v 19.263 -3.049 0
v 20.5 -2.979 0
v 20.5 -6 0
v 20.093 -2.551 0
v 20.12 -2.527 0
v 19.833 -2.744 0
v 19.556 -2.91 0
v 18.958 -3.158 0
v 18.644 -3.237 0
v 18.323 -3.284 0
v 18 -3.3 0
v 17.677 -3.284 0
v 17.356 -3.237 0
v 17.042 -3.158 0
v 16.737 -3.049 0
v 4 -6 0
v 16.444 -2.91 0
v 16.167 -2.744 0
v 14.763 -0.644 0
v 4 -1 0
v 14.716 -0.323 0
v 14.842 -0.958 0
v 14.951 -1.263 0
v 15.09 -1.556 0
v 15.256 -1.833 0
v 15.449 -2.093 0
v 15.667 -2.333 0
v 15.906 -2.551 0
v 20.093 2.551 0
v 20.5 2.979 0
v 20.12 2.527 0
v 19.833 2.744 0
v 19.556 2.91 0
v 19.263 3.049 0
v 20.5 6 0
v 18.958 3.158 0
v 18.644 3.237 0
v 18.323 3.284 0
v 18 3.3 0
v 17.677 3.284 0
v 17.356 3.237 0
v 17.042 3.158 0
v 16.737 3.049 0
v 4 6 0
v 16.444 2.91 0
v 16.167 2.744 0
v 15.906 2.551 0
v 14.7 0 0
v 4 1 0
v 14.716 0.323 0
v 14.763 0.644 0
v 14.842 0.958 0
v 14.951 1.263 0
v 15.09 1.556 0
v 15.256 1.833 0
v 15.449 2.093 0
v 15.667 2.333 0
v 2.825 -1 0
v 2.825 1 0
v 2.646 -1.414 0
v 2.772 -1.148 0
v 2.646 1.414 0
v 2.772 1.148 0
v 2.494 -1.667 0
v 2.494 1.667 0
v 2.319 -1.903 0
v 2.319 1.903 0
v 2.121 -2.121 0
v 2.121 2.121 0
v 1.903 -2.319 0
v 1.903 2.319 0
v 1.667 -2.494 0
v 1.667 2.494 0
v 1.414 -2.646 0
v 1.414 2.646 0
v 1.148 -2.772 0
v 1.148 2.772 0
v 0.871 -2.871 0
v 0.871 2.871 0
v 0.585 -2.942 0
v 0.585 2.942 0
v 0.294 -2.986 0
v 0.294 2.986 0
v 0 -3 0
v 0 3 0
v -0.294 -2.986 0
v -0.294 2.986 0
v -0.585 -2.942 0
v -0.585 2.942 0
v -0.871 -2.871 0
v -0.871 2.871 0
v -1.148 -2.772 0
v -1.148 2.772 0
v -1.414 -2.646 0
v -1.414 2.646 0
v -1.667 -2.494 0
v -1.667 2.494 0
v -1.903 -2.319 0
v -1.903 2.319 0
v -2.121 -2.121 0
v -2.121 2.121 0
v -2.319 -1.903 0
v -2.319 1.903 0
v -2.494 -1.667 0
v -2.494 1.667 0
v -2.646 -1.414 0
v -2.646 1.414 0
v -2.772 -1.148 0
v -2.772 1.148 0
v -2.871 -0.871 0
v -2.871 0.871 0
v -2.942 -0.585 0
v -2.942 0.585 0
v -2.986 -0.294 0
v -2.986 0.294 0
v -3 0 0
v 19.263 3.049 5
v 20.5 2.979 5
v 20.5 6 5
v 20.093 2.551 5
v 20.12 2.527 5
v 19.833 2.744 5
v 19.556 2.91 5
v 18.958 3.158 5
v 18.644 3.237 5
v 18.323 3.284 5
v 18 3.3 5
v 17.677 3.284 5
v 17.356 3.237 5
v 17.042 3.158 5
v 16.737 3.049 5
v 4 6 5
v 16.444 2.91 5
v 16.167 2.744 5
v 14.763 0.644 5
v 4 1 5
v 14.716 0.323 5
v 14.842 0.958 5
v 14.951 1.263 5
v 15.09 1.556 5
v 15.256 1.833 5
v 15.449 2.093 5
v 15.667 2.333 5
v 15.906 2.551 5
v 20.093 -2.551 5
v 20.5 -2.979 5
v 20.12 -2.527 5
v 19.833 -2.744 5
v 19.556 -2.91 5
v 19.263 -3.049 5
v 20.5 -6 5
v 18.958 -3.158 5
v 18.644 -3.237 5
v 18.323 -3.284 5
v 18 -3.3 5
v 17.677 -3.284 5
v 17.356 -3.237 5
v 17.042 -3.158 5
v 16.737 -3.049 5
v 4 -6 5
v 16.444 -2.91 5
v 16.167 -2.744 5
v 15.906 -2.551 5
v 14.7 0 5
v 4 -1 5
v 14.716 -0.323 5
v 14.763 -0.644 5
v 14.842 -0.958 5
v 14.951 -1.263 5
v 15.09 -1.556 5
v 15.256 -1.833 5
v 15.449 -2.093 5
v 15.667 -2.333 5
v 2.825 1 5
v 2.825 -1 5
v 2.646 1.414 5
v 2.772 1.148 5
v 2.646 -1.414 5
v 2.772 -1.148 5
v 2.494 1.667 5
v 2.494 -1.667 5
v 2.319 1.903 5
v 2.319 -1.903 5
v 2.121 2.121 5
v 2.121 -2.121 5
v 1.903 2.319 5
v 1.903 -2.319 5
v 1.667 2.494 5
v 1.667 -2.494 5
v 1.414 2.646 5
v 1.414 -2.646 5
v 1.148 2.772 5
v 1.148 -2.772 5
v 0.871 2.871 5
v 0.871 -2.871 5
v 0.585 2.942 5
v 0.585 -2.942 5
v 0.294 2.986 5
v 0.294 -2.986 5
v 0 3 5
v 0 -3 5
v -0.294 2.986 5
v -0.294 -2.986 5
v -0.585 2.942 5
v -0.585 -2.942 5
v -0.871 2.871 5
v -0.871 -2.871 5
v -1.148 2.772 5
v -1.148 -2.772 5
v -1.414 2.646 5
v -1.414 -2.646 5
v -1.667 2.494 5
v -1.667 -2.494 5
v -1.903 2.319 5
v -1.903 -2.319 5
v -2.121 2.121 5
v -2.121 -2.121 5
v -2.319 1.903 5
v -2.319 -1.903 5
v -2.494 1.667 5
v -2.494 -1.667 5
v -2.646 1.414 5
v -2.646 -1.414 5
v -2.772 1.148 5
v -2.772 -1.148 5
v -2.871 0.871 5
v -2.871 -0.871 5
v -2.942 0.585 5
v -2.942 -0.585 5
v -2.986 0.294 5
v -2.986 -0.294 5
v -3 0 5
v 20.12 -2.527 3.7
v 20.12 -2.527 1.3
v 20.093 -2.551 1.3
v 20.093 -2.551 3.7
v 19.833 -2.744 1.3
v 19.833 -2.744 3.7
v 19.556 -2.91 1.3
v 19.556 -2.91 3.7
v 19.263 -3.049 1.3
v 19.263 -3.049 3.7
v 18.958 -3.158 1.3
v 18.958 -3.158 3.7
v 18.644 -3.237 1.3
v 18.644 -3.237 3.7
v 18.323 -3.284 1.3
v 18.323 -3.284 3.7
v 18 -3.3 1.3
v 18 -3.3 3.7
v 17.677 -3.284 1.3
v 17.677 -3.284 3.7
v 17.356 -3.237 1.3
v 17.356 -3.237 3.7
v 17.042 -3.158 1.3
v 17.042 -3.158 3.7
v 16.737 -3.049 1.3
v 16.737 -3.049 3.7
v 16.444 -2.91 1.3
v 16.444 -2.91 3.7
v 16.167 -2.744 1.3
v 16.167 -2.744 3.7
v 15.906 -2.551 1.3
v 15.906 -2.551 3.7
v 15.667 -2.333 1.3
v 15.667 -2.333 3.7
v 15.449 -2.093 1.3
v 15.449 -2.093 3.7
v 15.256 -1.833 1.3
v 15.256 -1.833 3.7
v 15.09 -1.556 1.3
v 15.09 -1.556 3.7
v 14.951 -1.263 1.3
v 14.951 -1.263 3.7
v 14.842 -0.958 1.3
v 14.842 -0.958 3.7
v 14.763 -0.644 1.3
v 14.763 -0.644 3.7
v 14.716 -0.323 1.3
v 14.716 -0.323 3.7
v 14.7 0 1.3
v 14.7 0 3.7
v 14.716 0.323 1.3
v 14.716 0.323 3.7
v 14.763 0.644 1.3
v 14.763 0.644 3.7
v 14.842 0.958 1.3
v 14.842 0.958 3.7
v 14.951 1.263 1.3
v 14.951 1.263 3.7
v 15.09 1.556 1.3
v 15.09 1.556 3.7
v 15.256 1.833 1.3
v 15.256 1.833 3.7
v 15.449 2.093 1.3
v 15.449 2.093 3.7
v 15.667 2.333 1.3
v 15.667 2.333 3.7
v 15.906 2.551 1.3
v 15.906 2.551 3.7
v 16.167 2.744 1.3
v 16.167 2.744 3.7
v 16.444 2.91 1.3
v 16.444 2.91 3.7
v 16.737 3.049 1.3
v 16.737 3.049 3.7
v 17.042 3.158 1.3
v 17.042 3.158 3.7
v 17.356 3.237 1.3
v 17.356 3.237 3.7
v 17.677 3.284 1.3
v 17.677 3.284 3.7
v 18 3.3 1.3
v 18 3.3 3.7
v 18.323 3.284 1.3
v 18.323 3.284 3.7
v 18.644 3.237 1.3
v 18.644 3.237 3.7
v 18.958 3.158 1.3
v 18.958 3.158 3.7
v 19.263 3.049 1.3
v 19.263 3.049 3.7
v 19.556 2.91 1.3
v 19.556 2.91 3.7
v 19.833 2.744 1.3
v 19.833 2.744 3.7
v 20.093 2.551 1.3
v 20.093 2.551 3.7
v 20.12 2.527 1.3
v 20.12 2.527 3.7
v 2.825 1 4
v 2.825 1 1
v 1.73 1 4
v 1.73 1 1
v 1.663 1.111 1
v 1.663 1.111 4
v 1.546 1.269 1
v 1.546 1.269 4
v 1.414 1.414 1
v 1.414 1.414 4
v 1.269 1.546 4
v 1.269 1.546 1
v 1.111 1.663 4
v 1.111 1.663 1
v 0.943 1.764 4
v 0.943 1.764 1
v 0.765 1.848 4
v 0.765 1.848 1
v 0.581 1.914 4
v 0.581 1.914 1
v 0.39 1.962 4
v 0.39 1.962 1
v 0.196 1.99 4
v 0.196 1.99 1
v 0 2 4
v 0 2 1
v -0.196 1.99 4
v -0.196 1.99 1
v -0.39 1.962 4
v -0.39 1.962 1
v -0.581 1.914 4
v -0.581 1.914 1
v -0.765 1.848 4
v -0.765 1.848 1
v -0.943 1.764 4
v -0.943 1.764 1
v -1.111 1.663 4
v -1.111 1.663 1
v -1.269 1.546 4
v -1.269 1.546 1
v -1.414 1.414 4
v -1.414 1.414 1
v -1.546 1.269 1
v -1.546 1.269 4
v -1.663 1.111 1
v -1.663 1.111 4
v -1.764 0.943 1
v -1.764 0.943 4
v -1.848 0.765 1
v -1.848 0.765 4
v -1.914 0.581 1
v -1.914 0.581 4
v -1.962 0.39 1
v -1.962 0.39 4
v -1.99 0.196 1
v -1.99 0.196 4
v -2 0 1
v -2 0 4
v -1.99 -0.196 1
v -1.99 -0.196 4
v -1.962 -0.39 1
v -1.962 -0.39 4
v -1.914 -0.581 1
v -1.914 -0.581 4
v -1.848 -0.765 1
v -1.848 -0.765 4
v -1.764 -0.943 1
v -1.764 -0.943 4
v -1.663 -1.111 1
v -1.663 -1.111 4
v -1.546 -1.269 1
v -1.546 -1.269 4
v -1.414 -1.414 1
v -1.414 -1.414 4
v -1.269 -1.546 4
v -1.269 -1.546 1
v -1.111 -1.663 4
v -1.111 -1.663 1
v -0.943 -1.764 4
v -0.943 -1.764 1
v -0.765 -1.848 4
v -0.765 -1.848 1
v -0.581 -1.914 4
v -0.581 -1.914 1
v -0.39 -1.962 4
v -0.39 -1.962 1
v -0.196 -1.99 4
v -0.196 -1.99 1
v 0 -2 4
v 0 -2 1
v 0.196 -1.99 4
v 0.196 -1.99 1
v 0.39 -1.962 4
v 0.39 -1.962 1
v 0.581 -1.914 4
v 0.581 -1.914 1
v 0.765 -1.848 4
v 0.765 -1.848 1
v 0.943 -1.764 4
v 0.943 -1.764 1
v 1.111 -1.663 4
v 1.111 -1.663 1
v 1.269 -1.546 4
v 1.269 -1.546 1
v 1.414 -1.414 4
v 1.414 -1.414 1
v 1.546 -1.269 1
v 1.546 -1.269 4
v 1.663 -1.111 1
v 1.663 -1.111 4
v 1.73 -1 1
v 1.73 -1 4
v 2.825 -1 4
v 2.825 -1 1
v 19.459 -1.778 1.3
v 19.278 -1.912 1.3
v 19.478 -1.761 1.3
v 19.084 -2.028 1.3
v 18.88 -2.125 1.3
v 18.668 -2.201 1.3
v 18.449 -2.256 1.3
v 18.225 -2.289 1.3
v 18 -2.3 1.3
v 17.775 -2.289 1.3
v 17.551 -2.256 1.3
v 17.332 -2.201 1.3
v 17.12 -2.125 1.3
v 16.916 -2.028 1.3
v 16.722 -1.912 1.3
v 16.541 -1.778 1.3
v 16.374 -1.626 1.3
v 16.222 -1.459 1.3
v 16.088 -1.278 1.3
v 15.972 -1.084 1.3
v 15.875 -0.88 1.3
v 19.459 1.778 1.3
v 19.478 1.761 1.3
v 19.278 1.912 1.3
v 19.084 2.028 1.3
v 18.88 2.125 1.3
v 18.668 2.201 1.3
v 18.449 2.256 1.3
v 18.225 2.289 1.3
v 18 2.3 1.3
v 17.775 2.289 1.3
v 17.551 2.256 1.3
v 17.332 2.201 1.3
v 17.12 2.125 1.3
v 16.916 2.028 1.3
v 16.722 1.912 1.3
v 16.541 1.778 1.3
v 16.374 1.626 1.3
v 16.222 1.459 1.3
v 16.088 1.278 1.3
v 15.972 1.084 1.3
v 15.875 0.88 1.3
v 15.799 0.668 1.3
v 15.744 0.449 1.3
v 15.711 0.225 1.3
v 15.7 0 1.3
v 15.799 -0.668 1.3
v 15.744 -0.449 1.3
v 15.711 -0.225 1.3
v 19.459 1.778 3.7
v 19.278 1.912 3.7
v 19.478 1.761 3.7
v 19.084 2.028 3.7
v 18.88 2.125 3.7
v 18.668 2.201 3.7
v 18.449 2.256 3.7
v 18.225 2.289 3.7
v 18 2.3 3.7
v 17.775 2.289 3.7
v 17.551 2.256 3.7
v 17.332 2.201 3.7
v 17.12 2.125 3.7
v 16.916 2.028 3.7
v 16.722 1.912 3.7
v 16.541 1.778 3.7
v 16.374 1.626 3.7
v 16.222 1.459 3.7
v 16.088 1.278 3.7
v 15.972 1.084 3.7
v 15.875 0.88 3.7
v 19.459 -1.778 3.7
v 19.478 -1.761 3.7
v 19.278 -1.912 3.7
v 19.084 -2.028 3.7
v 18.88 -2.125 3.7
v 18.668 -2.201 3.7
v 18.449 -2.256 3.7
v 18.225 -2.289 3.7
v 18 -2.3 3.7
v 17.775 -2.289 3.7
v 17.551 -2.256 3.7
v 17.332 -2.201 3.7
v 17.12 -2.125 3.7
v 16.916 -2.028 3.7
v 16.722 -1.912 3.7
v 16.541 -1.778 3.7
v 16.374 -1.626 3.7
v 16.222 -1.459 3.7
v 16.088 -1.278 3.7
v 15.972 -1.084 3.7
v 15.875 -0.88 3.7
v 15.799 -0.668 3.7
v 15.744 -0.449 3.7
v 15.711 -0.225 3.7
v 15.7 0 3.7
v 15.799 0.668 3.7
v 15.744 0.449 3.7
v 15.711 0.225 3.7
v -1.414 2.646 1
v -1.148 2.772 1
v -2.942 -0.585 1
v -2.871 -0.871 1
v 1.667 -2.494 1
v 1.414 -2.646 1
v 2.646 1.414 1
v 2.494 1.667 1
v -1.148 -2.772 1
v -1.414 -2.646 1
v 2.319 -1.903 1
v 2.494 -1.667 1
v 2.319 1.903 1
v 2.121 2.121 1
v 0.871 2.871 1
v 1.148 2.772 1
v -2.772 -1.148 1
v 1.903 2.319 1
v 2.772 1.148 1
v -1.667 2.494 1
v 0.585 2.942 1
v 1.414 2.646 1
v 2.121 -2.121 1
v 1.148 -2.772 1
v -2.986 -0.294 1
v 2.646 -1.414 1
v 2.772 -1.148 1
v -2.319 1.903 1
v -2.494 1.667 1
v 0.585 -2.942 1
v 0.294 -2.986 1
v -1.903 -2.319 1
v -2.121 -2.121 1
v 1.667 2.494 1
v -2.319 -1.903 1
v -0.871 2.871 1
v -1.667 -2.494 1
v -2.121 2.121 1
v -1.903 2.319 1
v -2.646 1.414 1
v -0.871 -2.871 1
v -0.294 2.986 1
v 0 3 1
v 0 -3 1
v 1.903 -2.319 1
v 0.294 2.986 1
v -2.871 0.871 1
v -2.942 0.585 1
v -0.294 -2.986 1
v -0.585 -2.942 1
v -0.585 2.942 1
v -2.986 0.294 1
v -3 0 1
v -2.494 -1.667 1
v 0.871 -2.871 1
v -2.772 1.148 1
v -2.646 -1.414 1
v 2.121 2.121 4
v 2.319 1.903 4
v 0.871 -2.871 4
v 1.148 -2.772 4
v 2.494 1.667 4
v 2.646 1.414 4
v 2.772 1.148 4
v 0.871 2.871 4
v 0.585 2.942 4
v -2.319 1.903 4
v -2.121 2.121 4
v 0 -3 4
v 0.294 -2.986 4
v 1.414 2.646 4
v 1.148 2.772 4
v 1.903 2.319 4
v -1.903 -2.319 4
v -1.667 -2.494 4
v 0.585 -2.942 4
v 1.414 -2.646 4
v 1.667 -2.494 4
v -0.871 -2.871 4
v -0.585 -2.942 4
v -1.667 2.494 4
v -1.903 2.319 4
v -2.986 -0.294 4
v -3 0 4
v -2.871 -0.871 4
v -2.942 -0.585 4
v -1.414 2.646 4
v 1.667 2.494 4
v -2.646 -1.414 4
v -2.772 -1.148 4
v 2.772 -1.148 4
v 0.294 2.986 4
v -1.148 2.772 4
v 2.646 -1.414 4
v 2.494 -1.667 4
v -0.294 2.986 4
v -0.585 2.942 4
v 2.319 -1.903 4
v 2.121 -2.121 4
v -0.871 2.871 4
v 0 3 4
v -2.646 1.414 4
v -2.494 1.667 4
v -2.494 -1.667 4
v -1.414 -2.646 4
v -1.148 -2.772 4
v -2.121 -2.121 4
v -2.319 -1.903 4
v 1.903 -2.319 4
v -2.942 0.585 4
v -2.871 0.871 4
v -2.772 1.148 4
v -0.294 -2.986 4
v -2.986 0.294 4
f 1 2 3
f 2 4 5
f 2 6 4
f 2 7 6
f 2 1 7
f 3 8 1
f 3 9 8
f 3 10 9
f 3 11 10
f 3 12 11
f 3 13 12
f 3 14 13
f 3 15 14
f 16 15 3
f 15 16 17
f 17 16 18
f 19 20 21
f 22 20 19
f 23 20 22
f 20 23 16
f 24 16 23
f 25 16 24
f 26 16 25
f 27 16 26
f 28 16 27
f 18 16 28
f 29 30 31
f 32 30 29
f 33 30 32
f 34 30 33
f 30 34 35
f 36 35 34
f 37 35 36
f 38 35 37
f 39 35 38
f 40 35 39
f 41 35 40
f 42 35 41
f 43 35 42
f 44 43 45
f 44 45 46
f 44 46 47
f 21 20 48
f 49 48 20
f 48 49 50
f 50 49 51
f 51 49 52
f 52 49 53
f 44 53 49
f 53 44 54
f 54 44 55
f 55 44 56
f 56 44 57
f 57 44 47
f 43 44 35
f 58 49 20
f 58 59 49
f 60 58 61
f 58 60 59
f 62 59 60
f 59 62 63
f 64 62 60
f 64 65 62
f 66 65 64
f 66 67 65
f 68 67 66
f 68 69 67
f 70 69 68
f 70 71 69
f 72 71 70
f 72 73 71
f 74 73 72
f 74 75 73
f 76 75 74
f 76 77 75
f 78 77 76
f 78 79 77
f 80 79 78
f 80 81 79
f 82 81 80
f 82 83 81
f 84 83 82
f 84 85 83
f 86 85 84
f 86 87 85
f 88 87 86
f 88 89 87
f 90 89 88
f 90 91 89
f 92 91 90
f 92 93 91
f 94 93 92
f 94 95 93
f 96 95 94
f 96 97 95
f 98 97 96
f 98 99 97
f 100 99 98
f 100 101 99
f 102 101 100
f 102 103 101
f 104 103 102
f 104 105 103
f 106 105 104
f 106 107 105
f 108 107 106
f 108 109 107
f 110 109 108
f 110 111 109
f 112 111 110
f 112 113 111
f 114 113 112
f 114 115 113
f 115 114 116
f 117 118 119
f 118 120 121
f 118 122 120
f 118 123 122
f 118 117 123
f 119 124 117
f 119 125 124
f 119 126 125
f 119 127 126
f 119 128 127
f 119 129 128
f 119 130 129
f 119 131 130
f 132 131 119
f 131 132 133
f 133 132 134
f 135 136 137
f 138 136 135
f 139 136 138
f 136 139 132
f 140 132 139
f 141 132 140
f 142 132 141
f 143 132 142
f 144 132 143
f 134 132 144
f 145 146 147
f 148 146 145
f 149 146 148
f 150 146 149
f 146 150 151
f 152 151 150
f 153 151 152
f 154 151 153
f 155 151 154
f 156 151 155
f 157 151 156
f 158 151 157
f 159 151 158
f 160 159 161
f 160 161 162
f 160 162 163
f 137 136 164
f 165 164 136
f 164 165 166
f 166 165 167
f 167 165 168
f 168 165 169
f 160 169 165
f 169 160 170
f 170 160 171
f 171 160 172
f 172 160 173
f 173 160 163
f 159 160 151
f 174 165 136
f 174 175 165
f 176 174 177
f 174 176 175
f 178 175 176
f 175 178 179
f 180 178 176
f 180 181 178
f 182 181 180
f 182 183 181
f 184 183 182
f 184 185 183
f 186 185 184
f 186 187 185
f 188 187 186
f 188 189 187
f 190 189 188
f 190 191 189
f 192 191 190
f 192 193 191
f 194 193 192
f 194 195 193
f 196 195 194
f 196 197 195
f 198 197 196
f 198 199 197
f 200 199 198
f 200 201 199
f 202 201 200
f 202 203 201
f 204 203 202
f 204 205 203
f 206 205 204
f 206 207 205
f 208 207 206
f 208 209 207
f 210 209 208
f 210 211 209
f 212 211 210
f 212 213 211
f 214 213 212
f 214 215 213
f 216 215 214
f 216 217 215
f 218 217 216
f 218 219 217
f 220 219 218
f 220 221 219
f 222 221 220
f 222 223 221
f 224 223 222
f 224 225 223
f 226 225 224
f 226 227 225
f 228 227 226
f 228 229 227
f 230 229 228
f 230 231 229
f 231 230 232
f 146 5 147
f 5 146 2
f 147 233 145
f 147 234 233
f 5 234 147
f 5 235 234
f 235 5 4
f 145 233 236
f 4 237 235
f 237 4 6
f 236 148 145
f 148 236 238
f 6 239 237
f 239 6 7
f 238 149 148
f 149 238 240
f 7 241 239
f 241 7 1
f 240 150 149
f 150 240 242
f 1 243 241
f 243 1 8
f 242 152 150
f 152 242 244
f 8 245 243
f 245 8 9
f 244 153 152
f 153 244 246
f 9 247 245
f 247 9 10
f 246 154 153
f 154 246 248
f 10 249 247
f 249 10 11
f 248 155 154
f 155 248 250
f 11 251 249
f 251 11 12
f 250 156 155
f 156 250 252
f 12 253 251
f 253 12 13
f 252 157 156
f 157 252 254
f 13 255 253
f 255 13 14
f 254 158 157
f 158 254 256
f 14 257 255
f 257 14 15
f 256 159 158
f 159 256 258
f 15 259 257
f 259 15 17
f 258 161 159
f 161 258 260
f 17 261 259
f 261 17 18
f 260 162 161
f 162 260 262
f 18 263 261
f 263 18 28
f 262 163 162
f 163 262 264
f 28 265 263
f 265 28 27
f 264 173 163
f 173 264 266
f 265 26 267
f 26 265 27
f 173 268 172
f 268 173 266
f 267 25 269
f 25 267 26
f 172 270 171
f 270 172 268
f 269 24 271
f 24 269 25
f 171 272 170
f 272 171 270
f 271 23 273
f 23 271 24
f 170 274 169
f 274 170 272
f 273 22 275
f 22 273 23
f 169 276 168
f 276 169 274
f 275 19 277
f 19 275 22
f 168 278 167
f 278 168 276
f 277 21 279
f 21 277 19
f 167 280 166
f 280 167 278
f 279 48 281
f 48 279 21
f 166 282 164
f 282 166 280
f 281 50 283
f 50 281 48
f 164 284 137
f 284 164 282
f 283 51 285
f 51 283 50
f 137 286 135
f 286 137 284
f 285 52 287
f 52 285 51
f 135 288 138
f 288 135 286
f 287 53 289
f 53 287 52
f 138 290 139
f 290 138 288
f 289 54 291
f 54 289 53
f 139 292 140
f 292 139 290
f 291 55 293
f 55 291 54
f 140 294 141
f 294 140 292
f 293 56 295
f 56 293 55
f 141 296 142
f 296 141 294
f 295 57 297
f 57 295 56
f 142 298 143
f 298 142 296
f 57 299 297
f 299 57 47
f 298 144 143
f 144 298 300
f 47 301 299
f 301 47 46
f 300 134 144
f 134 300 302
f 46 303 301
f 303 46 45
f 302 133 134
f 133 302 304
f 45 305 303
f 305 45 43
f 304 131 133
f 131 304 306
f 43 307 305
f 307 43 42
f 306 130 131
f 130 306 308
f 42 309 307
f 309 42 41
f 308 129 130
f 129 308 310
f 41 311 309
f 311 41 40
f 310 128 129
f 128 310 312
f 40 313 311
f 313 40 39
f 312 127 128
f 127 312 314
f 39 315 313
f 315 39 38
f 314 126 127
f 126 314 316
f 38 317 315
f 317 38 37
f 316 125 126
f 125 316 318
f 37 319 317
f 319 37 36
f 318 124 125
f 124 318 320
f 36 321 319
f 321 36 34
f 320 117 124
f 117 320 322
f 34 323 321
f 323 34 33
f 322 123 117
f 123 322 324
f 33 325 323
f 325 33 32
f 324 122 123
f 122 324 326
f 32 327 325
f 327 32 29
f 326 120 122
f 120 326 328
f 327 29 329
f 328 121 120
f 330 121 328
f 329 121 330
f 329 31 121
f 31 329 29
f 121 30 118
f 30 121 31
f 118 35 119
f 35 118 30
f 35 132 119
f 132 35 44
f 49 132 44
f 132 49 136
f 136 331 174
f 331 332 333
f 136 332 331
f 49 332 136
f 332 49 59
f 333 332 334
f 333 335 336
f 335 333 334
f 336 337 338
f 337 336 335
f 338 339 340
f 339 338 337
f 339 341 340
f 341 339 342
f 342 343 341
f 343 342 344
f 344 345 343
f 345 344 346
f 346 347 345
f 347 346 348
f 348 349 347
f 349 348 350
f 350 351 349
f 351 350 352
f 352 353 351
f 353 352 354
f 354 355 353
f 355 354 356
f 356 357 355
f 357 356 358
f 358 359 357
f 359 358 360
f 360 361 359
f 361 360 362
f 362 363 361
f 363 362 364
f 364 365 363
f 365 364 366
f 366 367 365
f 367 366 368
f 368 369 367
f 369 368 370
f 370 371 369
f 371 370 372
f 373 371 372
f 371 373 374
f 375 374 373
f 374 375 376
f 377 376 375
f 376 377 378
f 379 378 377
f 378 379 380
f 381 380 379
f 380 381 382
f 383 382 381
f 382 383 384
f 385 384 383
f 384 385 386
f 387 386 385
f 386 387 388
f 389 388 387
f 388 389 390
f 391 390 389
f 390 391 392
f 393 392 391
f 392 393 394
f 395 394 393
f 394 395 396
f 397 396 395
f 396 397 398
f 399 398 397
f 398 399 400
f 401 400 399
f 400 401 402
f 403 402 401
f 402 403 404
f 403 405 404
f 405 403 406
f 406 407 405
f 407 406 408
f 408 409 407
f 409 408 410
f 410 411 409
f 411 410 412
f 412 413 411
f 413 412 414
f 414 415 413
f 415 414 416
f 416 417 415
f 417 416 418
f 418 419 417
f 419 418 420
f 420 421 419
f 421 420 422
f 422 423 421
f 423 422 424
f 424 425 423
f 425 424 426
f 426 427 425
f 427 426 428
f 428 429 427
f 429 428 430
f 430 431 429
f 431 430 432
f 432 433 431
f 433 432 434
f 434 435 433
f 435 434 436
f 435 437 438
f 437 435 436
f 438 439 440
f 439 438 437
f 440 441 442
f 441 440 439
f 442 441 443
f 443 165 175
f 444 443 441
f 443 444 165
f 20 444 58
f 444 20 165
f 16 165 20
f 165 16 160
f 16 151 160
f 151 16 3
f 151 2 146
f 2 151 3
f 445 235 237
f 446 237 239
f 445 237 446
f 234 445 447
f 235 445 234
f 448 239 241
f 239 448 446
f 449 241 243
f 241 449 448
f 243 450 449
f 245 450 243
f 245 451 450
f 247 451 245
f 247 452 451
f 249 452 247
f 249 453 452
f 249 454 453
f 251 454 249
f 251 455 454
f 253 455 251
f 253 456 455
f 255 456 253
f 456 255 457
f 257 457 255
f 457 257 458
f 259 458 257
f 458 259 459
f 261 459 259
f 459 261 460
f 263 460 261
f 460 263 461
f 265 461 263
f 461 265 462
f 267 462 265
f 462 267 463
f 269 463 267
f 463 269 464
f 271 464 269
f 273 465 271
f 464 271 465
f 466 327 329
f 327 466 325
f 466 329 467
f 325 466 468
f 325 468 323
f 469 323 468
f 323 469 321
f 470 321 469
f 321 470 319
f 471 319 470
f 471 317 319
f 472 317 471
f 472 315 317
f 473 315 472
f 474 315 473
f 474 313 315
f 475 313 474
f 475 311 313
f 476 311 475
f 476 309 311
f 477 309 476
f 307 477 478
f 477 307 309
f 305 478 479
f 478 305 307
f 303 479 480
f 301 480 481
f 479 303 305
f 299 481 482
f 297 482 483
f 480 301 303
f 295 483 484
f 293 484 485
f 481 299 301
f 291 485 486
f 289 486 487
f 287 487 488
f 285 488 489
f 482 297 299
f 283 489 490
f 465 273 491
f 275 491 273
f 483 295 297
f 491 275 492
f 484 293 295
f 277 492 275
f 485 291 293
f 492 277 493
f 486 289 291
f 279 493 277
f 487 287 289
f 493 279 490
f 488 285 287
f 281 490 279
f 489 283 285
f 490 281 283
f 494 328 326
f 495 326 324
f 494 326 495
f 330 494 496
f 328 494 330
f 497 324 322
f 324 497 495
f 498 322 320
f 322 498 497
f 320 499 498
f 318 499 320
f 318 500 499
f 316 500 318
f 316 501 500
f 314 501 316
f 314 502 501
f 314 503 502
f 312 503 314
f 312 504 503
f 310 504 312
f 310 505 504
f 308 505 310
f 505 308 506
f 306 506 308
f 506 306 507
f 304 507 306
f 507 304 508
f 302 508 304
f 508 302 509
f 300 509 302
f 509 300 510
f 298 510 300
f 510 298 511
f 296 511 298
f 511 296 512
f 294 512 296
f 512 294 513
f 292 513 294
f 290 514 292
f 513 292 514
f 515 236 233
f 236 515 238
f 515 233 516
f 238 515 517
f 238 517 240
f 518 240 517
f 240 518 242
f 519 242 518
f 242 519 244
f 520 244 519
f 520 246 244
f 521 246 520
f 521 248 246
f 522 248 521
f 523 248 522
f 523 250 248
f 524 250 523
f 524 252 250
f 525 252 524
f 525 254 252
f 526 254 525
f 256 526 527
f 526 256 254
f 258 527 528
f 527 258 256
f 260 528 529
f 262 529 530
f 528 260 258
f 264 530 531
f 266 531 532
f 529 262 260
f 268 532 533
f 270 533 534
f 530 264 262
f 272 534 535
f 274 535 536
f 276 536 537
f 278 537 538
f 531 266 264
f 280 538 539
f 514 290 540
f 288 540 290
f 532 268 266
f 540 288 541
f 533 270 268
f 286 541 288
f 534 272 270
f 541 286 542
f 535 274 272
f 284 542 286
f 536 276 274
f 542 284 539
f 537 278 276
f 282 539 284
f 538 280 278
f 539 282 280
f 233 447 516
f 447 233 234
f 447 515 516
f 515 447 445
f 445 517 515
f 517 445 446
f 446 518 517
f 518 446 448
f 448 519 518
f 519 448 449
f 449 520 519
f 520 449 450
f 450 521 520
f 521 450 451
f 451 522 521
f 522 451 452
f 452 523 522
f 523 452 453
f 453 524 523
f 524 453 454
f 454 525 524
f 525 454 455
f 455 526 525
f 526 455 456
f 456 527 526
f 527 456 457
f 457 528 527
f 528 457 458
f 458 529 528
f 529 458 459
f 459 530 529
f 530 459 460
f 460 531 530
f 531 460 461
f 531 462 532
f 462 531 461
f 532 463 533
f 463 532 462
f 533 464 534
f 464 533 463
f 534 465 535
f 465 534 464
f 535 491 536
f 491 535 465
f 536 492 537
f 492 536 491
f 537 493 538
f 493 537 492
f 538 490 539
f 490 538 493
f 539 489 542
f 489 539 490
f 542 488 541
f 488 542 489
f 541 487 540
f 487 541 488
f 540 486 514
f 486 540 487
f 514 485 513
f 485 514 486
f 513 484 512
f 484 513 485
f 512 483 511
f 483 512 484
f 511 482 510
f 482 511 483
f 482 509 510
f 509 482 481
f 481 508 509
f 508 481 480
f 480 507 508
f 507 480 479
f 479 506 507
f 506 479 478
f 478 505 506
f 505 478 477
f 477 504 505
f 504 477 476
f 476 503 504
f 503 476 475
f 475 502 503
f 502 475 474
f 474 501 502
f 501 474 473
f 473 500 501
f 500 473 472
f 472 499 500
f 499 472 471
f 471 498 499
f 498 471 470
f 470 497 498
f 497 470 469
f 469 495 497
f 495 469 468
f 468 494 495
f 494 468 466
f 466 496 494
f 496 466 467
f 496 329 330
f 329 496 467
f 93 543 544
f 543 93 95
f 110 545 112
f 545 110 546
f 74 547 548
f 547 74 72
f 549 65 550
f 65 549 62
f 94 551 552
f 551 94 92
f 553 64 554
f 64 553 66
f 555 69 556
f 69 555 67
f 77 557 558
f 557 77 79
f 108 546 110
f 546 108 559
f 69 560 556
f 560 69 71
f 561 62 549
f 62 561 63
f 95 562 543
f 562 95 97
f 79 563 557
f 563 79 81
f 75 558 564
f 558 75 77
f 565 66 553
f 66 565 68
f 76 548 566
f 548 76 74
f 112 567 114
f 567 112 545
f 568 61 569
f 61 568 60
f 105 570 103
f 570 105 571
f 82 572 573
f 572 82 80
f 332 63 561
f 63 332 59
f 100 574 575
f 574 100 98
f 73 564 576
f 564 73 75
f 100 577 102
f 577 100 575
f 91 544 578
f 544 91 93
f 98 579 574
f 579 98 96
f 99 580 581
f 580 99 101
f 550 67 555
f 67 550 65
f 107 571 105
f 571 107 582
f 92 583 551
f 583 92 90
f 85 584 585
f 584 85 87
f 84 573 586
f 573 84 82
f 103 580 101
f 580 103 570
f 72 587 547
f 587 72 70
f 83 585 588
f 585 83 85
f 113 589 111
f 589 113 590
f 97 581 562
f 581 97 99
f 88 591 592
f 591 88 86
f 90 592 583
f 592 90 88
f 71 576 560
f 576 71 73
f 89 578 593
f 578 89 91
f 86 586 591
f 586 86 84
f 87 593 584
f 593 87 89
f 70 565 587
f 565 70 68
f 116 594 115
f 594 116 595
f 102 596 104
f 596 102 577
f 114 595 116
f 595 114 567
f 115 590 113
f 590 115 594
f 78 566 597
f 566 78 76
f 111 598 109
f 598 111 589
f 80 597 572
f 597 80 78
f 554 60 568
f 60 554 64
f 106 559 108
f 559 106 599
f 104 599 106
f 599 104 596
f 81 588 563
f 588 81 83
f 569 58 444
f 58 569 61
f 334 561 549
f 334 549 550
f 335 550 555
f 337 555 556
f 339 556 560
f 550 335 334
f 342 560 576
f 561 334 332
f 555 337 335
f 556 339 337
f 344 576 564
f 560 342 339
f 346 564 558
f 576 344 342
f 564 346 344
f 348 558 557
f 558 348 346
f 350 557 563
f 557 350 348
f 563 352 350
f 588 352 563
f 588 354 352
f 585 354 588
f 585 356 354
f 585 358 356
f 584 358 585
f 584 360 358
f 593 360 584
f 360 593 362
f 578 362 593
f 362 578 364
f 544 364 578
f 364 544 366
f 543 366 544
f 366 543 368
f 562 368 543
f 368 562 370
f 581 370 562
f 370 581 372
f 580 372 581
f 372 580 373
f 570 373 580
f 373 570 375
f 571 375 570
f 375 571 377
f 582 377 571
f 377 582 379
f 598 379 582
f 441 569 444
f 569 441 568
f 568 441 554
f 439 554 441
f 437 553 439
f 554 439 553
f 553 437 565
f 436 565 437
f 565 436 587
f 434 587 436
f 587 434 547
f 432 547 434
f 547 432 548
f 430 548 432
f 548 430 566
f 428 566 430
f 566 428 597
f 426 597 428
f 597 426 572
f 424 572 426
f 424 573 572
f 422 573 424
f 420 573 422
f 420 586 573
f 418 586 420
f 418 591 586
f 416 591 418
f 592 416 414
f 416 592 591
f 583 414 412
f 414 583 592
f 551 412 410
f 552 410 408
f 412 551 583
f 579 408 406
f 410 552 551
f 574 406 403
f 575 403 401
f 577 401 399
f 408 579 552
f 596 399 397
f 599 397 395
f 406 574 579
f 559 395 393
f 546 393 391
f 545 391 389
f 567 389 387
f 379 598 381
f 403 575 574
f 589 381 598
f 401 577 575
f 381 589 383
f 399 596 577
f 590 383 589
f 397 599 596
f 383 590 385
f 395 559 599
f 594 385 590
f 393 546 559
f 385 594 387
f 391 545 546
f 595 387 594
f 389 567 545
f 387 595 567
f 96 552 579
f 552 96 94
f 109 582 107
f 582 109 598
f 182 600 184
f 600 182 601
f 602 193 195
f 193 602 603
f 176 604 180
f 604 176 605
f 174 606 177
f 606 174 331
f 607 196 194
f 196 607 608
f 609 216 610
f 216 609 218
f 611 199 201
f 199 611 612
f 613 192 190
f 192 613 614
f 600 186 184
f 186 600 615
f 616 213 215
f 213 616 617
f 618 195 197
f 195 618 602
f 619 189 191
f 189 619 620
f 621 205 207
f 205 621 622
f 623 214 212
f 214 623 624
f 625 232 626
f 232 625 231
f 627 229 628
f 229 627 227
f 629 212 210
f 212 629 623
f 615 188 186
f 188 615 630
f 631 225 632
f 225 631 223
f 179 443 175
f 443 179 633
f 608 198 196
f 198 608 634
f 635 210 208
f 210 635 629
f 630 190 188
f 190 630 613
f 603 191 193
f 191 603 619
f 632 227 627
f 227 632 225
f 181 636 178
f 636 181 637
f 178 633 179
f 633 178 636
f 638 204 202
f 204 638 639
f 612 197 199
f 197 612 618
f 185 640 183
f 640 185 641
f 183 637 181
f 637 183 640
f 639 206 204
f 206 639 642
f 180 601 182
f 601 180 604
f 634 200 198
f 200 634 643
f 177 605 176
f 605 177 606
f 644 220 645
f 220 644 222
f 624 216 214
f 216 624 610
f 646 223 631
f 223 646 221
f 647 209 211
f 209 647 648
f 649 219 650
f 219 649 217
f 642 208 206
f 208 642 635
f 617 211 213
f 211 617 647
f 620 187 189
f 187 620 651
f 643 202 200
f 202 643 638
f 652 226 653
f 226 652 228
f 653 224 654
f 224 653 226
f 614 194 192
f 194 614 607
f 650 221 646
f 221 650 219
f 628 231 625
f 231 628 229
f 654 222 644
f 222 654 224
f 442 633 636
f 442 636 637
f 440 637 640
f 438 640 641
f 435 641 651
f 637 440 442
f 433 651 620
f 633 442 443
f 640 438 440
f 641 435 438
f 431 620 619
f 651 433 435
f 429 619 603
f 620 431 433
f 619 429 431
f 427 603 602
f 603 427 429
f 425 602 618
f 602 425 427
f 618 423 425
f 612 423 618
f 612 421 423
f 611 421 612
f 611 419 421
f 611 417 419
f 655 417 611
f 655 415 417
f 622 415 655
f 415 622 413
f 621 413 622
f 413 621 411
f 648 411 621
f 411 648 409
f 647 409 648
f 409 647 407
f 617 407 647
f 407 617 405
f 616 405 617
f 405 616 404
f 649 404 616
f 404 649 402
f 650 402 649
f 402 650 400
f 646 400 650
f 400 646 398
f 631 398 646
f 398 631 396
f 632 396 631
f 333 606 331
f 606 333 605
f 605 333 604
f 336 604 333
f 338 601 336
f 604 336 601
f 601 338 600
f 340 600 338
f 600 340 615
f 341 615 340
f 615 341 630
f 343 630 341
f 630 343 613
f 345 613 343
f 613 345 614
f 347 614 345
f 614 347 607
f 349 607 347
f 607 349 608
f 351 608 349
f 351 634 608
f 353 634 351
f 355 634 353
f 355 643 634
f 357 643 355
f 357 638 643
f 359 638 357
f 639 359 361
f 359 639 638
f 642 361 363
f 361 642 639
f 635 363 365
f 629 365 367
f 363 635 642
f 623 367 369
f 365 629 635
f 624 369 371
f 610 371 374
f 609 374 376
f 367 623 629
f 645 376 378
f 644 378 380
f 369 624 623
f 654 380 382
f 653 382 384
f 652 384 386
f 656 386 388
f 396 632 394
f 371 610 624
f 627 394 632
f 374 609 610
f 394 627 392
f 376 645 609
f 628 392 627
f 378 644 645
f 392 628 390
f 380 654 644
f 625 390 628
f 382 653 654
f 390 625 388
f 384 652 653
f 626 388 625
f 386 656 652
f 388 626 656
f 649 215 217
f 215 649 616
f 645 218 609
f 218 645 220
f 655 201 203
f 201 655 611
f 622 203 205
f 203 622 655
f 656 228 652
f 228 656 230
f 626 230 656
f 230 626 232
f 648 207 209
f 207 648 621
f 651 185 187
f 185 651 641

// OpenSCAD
part = "link"; // [link, assembly]
cadverify_only = "";
module instance(name, part, unit = 1) {
    echo(cadverify_instance = [name, part, unit]);
    if (cadverify_only == "" || cadverify_only == name) children();
}

// Parameters (mm)
pitch = 18;          // pin-to-bore distance
link_w = 12;         // width (Y)
link_t = 5;          // thickness (Z)
pin_d = 4;           // pin shaft diameter
bore_d = 4.6;        // bore diameter (0.3 radial clearance)
cap_d = 6;           // cap diameter
cap_h = 1;           // cap thickness
gap_z = 0.3;         // vertical clearance cap<->knuckle
kn_h = 2.4;          // knuckle height = 5-2*1-2*0.3
kn_out_d = 7.6;      // knuckle outer diameter (1.5 wall)
cap_cav_d = 6.6;     // cap cavity diameter (0.3 radial clearance)
neck_w = 2;          // neck width
slot_half = 50;      // slot half-angle (deg), allows +-30 deg swing
yoke_east = 20.5;    // full-height yoke east extent (local X)
$fn = 64;

module link_geom() {
    bore_x = pitch;
    cap_r = cap_d/2;
    cav_r = cap_cav_d/2;
    pin_r = pin_d/2;
    bore_r = bore_d/2;
    kn_out_r = kn_out_d/2;
    // far points for slot wedge (full height + middle)
    // wedge from bore center to the east, half-angle slot_half
    wedge_far = 30;
    dy_far = wedge_far * tan(slot_half);
    // ---- full height (0..5): yoke + neck + pin shaft ----
    linear_extrude(height = link_t, convexity = 8) {
        difference() {
            union() {
                // pin shaft disc
                translate([0,0]) circle(r = pin_r);
                // neck rect X[0,5] Y[-1,1]
                translate([0,-neck_w/2]) square([5, neck_w]);
                // yoke base rect X[4,yoke_east] Y[-6,6]
                translate([4,-link_w/2]) square([yoke_east-4, link_w]);
            }
            // cap cavity (for next link caps)
            translate([bore_x,0]) circle(r = cav_r);
            // slot wedge for next-link neck swing (full height)
            polygon(points = [[bore_x,0],[bore_x+wedge_far, dy_far],[bore_x+wedge_far, -dy_far]]);
        }
    }
    // ---- middle knuckle ring (1.3..3.7) ----
    kn_bot = cap_h + gap_z; // 1.3
    translate([0,0,kn_bot])
    linear_extrude(height = kn_h, convexity = 8) {
        difference() {
            translate([bore_x,0]) circle(r = kn_out_r);
            translate([bore_x,0]) circle(r = bore_r);
            polygon(points = [[bore_x,0],[bore_x+wedge_far, dy_far],[bore_x+wedge_far, -dy_far]]);
        }
    }
    // ---- caps ----
    translate([0,0,0]) cylinder(h = cap_h, r = cap_r);
    translate([0,0,link_t-cap_h]) cylinder(h = cap_h, r = cap_r);
}

if (part == "assembly") {
    instance("link1", "link", 1) translate([0,0,0]) link_geom();
    instance("link2", "link", 1) translate([18,0,0]) link_geom();
    instance("link3", "link", 1) translate([36,0,0]) link_geom();
    echo(cadverify_spec = [
        ["bounds", [[-3, -6, 0], [56.5, 6, 5]]],
        ["support_faces", [["bed", "-z", 200]]],
        ["motions", [
            ["bend", ["link3"], "rotate", [36, 0, 0], [0, 0, 1], [-30, 30]]
        ]],
        ["assembly_order", [
            [["link1", "link2", "link3"], [0, 0, 0]]
        ]],
        ["print_in_place", 0.3],
        ["overhangs_allowed", [
            ["pin cap link1", [[-3, -3, 3.8], [3, 3, 4.2]]],
            ["knuckle joint1", [[14.5, -3.5, 1.0], [21, 3.5, 1.5]]],
            ["pin cap link2", [[15, -3, 3.8], [21, 3, 4.2]]],
            ["knuckle joint2", [[32.5, -3.5, 1.0], [39, 3.5, 1.5]]],
            ["pin cap link3", [[33, -3, 3.8], [39, 3, 4.2]]],
            ["knuckle end", [[50.5, -3.5, 1.0], [57, 3.5, 1.5]]]
        ]],
        ["held", ["link1", "link2", "link3"]]
    ]);
} else {
    link_geom();
    echo(cadverify_spec = [
        ["bounds", [[-3, -6, 0], [20.5, 6, 5]]],
        ["bodies", 1],
        ["through_holes", 0],
        ["support_faces", [["bed", "-z", 100]]],
        ["overhangs_allowed", [
            ["pin cap", [[-3, -3, 3.8], [3, 3, 4.2]]],
            ["knuckle ceiling", [[14.5, -3.5, 1.0], [21, 3.5, 1.5]]]
        ]],
        ["copies", 3],
        ["details", [
            ["body", "material", [[4, -6, 0], [14, 6, 5]], 0.85],
            ["neck", "material", [[0, -1, 0], [5, 1, 5]], 0.8],
            ["knuckle", "material", [[14.2, -3.8, 1.3], [21.8, 3.8, 3.7]], 0.25],
            ["slot", "void", [[19, -1, 0], [21, 1, 5]], 0.8],
            ["cap_cavity", "void", [[14.7, -3.3, 0], [21.3, 3.3, 1]], 0.5],
            ["wall", "thickness", [18, 0, 2.5], [0, 1, 0], 1.5],
            ["floor", "thickness", [9, 0, -1], [0, 0, 1], 5]
        ]]
    ]);
}
